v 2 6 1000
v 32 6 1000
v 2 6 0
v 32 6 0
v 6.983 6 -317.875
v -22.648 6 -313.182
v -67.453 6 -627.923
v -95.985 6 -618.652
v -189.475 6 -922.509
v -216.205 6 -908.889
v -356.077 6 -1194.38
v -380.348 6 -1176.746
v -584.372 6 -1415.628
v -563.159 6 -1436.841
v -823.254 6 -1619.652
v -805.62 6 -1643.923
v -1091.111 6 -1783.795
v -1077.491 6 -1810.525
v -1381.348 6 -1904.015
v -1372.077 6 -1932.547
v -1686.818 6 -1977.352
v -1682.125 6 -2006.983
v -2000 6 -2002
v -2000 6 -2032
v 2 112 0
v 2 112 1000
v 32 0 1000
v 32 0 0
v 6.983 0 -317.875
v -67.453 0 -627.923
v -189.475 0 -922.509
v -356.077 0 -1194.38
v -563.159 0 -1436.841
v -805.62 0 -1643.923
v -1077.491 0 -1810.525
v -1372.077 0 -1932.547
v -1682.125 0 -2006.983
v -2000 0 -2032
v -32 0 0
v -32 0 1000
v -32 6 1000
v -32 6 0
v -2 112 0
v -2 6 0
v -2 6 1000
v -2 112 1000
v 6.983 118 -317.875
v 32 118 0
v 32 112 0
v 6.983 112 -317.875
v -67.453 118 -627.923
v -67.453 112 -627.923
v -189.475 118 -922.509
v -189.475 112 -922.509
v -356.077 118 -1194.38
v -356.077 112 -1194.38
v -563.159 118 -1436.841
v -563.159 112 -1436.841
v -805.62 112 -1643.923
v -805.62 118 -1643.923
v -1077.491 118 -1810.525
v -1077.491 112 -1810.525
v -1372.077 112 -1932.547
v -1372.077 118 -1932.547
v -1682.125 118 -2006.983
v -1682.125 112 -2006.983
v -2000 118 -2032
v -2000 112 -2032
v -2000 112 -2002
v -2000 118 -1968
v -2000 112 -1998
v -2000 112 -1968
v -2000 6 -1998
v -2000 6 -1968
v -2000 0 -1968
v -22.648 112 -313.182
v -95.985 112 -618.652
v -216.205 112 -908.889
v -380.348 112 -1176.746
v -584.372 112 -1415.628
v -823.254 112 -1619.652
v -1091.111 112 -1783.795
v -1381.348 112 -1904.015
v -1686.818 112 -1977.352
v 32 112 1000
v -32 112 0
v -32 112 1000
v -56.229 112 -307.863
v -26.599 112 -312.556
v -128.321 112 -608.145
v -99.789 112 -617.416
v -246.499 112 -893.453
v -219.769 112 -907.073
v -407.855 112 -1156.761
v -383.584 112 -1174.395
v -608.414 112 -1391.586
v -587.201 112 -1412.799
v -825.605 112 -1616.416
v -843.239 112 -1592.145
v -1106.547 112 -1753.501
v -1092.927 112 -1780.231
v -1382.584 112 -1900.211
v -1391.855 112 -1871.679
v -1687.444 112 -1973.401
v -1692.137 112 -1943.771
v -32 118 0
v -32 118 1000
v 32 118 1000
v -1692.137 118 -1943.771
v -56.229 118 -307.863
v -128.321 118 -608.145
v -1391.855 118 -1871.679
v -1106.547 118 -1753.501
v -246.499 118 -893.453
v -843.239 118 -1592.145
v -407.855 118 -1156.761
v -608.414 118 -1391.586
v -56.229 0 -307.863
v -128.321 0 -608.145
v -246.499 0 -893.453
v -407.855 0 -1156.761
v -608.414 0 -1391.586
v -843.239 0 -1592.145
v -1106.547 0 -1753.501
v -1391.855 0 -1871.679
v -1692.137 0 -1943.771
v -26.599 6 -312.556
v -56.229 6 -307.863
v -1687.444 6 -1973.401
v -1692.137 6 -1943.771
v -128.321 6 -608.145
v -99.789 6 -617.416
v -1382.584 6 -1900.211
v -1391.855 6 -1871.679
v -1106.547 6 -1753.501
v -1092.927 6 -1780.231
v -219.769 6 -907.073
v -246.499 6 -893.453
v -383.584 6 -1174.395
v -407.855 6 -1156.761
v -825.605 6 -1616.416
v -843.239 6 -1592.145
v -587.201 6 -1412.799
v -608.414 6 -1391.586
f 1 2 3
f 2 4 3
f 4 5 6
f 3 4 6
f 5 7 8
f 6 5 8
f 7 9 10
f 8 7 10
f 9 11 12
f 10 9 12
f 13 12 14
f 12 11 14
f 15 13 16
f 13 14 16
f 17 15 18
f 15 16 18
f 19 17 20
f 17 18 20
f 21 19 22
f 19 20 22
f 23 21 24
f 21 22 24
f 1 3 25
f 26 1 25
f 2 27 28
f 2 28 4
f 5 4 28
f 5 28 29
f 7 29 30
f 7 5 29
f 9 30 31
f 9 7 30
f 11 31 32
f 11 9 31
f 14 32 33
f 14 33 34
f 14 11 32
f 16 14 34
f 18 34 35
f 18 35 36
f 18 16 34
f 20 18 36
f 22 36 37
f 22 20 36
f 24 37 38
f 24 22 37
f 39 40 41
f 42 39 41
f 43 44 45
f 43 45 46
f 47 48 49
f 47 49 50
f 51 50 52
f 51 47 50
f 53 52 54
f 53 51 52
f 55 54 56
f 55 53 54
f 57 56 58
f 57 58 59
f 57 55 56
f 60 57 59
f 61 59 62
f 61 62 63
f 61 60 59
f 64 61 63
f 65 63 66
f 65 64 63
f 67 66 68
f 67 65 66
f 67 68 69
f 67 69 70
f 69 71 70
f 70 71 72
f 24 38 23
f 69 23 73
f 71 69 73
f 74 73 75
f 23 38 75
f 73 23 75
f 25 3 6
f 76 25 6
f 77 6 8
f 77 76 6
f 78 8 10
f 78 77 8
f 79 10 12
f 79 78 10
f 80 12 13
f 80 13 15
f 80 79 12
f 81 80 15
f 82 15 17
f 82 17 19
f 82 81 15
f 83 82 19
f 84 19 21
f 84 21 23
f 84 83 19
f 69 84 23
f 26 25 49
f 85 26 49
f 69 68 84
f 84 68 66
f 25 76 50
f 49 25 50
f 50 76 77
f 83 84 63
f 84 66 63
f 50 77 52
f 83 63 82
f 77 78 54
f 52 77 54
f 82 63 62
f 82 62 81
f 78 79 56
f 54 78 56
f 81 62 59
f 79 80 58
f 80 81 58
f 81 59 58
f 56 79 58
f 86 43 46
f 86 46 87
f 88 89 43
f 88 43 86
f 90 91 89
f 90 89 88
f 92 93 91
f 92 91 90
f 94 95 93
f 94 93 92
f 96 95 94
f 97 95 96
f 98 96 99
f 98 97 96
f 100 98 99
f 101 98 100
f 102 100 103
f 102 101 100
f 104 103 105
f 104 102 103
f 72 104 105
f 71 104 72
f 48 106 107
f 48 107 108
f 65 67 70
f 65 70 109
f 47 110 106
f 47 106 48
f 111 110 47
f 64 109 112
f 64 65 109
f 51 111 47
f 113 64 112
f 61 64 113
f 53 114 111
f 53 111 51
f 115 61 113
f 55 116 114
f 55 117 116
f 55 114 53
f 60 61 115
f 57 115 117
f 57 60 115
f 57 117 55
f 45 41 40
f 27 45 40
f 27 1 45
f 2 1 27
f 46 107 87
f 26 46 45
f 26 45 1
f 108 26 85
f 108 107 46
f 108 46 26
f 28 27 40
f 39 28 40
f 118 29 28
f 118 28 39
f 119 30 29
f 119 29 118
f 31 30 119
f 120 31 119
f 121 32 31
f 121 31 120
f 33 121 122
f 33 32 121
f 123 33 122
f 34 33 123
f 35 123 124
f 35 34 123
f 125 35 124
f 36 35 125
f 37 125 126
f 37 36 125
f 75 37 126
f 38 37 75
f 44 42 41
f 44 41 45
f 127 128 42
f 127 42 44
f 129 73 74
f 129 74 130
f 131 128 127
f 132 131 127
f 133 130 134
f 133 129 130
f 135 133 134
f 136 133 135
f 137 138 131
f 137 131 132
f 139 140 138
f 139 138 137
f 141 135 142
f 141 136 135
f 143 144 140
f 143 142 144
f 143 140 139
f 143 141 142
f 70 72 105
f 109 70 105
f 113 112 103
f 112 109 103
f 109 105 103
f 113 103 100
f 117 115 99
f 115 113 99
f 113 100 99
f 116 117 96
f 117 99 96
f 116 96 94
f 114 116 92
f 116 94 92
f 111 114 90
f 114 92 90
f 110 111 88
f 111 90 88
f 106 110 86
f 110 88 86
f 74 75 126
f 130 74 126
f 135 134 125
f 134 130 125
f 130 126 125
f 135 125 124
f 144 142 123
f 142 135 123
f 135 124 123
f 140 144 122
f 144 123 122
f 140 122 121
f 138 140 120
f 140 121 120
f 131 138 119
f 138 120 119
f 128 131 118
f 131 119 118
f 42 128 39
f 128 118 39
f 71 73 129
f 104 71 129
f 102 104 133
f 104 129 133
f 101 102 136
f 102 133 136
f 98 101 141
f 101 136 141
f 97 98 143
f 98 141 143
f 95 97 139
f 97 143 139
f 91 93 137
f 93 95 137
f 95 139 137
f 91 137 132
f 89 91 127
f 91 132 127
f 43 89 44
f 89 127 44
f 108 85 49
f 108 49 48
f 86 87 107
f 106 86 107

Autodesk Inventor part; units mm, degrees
ref_plane "YZ Plane" through (0, 0, 0) normal (1, 0, 0) x (0, 1, 0)
ref_plane "XZ Plane" through (0, 0, 0) normal (0, 1, 0) x (-1, 0, 0)
ref_plane "XY Plane" through (0, 0, 0) normal (0, 0, 1) x (1, 0, 0)
sketch "Sketch1" plane through (0, 0, 0) normal (0, 0, 1) x (1, 0, 0)
  line L0 (0, 0) -> (32, 0)
  line L1 (32, 0) -> (32, 6)
  line L2 (32, 6) -> (2, 6)
  line L3 (2, 6) -> (2, 112)
  line L4 (2, 112) -> (32, 112)
  line L5 (32, 112) -> (32, 118)
  line L6 (32, 118) -> (0, 118)
  line L7 (0, 118) -> (0, 0) construction
  line L8 (0, 0) -> (-32, 0)
  line L9 (-32, 0) -> (-32, 6)
  line L10 (-32, 6) -> (-2, 6)
  line L11 (-2, 6) -> (-2, 112)
  line L12 (-2, 112) -> (-32, 112)
  line L13 (-32, 112) -> (-32, 118)
  line L14 (-32, 118) -> (0, 118)
  dimension "d0" = 6
  dimension "d1" = 2
  dimension "d2" = 6
  dimension "d3" = 32
  dimension "d4" = 118
  dimension "d5" = 32
extrude "Extrusion1" add sketch "Sketch1" along normal blind 1000
sketch "Sketch2" plane through (-32, 118, 0) normal (0, 1, 0) x (1, 0, 0)
  line L0 (32, 0) -> (-1790.7969, 0) construction
  line L1 (64, 0) -> (0, 0) projected
  arc A0 (32, 0) -> (-1968, 2000) centre (-1968, 0) ccw
  line L2 (-1968, 0) -> (-1968, 2000) construction
  line L3 (-1968, 0) -> (32, 0) construction
  dimension "d9" = 90
  dimension "d10" = 2000
sweep "Sweep1" add profiles "Sketch1" path "Sketch2" path curves A0
properties part number "Rail_beam"
